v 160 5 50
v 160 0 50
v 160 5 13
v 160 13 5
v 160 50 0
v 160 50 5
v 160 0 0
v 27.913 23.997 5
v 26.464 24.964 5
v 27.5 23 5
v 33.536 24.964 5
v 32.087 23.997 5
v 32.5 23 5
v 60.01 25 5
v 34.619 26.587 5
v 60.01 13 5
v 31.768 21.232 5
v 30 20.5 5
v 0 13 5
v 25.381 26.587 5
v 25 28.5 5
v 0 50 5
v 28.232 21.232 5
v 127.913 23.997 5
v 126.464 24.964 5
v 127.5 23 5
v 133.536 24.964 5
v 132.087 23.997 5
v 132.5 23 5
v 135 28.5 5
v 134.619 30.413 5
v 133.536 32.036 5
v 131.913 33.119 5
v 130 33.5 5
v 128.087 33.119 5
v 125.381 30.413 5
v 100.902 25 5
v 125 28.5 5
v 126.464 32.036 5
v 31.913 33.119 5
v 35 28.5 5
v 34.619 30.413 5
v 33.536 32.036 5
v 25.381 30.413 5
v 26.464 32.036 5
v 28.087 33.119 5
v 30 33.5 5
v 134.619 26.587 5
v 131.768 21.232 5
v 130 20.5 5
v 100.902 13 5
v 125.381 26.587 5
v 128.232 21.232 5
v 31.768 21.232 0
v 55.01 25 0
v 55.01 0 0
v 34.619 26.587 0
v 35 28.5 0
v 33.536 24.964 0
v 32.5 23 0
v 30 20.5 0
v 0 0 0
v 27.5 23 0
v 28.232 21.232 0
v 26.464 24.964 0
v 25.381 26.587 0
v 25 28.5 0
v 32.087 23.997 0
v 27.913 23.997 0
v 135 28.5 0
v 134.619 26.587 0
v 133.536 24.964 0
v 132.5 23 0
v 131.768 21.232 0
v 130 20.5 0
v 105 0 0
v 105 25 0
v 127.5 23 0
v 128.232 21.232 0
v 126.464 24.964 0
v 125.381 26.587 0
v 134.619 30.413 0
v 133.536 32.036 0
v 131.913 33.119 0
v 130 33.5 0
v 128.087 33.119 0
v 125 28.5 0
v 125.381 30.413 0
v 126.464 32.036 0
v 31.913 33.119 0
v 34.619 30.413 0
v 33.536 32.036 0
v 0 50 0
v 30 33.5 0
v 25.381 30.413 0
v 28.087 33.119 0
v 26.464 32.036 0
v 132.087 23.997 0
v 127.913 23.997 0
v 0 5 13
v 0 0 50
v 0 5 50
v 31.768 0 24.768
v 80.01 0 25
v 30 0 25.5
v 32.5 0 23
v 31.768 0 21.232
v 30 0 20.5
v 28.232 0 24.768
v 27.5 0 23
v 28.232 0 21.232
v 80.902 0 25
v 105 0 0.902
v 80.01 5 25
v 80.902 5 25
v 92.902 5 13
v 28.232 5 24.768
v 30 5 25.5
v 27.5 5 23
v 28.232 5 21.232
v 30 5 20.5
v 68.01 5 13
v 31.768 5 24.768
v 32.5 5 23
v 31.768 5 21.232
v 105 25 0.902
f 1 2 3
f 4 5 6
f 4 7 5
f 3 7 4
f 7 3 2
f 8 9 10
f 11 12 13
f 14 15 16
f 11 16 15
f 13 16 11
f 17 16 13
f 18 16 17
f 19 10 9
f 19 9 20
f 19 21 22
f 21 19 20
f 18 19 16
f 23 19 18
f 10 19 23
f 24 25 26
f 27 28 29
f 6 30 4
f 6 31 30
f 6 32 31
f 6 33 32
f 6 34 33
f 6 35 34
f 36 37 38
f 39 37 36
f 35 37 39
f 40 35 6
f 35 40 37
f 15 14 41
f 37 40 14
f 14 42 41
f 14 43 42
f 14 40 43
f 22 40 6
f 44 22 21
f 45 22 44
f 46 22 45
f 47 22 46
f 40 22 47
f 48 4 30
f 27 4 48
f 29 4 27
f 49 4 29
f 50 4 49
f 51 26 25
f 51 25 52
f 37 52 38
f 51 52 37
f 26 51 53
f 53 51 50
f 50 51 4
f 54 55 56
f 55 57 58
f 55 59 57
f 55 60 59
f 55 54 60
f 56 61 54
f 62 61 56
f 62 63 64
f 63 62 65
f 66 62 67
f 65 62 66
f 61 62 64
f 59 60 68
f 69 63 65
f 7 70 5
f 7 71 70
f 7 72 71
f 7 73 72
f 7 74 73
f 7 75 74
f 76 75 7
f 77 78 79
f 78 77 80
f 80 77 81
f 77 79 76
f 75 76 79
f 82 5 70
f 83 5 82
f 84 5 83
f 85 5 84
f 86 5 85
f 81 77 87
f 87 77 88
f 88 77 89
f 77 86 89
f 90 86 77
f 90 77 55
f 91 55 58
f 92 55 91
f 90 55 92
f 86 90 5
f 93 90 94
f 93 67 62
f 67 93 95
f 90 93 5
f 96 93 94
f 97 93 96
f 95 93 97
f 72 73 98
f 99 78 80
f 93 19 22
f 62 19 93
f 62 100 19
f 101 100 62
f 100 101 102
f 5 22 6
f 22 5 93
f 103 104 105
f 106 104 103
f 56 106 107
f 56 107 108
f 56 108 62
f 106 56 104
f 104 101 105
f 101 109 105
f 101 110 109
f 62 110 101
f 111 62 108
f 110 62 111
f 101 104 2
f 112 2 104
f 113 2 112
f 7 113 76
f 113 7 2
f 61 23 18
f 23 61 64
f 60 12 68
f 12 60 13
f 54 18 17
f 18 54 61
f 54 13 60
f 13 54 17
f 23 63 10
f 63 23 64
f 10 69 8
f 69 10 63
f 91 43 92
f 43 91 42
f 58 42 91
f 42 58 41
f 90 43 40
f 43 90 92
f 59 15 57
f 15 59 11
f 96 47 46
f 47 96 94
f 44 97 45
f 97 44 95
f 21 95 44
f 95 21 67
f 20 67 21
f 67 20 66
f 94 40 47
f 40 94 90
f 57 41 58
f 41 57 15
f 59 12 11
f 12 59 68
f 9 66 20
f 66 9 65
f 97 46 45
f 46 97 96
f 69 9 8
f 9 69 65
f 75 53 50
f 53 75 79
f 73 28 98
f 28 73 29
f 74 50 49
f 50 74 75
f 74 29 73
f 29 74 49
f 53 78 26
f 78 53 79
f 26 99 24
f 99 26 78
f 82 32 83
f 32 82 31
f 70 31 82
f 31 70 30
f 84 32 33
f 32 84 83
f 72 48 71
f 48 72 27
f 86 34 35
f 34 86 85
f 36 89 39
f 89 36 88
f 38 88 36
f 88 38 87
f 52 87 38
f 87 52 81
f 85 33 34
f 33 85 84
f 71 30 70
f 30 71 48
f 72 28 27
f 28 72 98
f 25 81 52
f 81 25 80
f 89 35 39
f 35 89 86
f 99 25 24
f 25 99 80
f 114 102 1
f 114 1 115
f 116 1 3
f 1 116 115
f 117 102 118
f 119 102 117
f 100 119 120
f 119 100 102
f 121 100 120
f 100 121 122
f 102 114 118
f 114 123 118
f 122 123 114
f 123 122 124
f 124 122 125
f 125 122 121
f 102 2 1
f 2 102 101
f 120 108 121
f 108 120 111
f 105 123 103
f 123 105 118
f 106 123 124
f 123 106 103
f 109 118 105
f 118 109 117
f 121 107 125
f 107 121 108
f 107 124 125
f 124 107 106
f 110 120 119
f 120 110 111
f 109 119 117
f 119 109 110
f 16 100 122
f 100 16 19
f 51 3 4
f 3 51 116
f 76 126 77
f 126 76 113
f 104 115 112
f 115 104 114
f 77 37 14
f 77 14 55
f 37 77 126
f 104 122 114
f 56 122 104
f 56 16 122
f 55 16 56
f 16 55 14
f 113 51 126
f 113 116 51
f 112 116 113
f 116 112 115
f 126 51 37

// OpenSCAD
/*
mounting bracket for tv set cables
@mirontoli 
version 6 2026-09-02
*/
w=160;
d=50;
h=5;
eps = 0.01;
screw_hole_r = 2.5;
screw_hole_x_pad = 30;
screw_hole_x_pad_opposite = w - screw_hole_x_pad;
screw_hole_d = 23;
screw_mount_r = 5;
screw_mount_d = screw_hole_d + screw_hole_r*2.2;
gusset_w = 18;
w_cable = 50;
d_cable = 25;

assert(gusset_w < screw_hole_d - screw_hole_r, 
"the screw hole position must be higher than the gusset");
assert(d > screw_hole_d + screw_hole_r + eps, 
"the depth must be higher than the position depth of the screw hole");
assert(screw_hole_x_pad < w/2 - screw_hole_r - eps, 
"screw hole padding should not be bigger than the half of the widht of mounting bracket");


module vertical_plate() {
    difference() {
        cube([w,d,h]);
        
        translate([screw_hole_x_pad, screw_hole_d, -eps])
            cylinder(h=h+2*eps, r=screw_hole_r);
        translate([screw_hole_x_pad, screw_mount_d, -eps])
            cylinder(h=h+2*eps, r=screw_mount_r);
        
        translate([screw_hole_x_pad_opposite, screw_hole_d, -eps])
            cylinder(h=h+2*eps, r=screw_hole_r);
        translate([screw_hole_x_pad_opposite, screw_mount_d, -eps])
            cylinder(h=h+2*eps, r=screw_mount_r);
    }
}

module horizontal_plate() {
translate([0,h,0]) 
    rotate([90,0,0])
        difference() {       
            cube([w,d,h]);
            translate([screw_hole_x_pad, screw_hole_d, -eps])
                cylinder(h=h+2*eps, r=screw_hole_r);
        }
}

module full_width_gusset() {        
    translate([w,0,0])
            rotate([0,270,0])
                linear_extrude(height = w)
                    polygon([
                        [0, 0],
                        [gusset_w, 0],
                        [0, gusset_w]
                    ]);
}

module cable_hole() {
    translate([w/2-w_cable/2,-eps,-eps]) 
        difference() {
            cube([w_cable,d_cable+eps,d_cable+eps]);
            rotate([0, -45, 0])
                cube([w_cable, d_cable+2*eps, d_cable+2*eps]);
            rotate([0, 45, 0])
                translate([0, -eps, 36])
                    cube([w_cable, d_cable+3*eps, d_cable+2*eps]);
        }
}

module mounting_bracket() {
    difference() {
        union() {
            vertical_plate();
            horizontal_plate();
            full_width_gusset();
        }
        cable_hole();
    }
}

mounting_bracket();

// test print
/*
!difference() {
    mounting_bracket();
    translate([w/4, -eps, -eps])
        cube([2*w,2*d,2*d]);
}
*/
